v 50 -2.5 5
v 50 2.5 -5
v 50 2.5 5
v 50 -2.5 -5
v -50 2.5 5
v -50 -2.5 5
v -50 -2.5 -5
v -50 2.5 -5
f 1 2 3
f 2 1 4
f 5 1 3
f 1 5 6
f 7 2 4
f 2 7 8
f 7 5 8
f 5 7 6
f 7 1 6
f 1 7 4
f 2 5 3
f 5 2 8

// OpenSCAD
module linear_guide_rail() {
    difference() {
        // Main body of the rail
        translate([-50, -7.5, -5])
            cube([100, 15, 10]);
        
        // Cutouts for the rail
        translate([-50, -7.5, -5])
            cube([100, 5, 10]);
        
        translate([-50, 2.5, -5])
            cube([100, 5, 10]);
    }
}

linear_guide_rail();
